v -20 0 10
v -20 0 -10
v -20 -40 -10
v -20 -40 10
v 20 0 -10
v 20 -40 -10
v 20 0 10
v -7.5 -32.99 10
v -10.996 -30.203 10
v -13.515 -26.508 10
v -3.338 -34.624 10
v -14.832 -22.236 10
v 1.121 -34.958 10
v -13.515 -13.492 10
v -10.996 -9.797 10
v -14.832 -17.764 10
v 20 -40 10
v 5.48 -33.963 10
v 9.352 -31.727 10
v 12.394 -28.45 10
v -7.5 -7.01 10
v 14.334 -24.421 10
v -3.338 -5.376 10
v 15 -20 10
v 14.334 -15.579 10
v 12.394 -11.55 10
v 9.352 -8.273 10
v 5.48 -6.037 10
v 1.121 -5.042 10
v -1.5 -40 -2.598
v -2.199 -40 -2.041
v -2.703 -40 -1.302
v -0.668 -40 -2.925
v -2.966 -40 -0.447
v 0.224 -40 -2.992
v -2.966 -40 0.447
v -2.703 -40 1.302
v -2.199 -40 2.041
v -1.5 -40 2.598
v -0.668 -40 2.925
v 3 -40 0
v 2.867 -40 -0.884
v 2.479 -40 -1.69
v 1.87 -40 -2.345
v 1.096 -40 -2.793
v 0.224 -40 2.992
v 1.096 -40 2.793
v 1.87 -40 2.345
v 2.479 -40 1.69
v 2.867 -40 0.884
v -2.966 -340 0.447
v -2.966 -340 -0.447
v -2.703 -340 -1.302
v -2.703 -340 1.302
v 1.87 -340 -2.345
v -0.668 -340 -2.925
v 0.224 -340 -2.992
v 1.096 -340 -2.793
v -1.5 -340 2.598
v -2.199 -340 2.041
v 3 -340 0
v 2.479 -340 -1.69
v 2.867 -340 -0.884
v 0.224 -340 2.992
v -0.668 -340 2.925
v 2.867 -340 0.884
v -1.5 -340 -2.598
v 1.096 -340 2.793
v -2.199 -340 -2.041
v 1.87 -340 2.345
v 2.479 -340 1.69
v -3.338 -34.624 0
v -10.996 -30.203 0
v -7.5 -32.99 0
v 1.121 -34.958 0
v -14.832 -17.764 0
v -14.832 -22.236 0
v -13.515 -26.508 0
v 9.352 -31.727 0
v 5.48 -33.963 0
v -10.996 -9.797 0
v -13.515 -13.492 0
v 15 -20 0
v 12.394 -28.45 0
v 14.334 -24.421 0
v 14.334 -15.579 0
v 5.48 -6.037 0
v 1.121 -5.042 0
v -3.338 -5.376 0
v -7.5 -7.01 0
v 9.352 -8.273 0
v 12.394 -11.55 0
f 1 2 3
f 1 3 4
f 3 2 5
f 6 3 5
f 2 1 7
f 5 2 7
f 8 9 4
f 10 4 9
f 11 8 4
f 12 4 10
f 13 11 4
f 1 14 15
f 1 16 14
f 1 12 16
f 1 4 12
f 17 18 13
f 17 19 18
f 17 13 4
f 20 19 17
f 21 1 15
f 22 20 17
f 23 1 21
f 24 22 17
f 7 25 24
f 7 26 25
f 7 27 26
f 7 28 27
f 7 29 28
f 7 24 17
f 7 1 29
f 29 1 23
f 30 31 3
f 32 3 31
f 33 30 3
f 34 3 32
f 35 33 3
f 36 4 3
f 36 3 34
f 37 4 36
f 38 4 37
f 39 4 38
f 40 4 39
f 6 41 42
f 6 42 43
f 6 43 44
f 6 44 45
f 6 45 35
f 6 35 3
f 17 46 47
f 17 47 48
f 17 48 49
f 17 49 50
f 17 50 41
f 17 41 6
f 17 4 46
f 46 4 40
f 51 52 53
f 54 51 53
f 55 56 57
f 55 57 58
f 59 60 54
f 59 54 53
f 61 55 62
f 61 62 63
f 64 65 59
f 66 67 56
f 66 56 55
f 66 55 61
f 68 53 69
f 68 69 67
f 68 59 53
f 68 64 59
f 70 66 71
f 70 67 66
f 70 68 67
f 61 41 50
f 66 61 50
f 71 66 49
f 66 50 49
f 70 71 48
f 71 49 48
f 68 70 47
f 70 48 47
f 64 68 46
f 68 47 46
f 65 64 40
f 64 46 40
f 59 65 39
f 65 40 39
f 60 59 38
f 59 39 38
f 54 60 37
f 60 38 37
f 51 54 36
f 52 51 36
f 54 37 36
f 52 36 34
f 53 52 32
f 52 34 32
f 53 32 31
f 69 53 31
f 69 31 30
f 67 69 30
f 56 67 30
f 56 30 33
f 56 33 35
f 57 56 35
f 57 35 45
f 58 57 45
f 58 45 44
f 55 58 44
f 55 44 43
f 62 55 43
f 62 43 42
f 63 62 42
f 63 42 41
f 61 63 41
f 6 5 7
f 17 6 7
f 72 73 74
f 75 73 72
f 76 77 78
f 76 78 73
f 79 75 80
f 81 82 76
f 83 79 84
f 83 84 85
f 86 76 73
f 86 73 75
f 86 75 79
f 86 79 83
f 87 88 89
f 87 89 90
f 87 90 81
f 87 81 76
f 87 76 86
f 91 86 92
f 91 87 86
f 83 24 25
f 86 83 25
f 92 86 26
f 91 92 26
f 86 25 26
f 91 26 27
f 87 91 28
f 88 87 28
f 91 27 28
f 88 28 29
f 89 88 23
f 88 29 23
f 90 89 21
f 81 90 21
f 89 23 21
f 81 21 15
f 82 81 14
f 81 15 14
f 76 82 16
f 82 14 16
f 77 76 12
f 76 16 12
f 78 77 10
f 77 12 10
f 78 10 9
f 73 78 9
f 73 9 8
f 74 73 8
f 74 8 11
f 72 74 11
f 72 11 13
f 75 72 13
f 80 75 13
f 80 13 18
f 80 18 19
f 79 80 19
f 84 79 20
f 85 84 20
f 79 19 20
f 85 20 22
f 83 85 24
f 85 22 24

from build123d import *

# Parameters (mm, degrees)
F0_R     = 3
F1_DEPTH = 340
F2_W     = 40
F2_H     = 20
F3_DEPTH = 40
F4_R     = 15
F5_DEPTH = 10


with BuildPart() as f1:
    # F0 (on Front) → F1 (new body)
    with BuildSketch(Plane.XZ):
        Circle(F0_R)
    extrude(amount=F1_DEPTH)

    # F2 (on Front) → F3 (join)
    with BuildSketch(Plane.XZ):
        Rectangle(F2_W, F2_H)
    extrude(amount=F3_DEPTH)

    # F4 (on face) → F5 (cut)
    with BuildSketch(Plane.XY.offset(10)):
        with Locations((0, -20)):
            Circle(F4_R)
    extrude(amount=-F5_DEPTH, mode=Mode.SUBTRACT)


solid = f1.part
